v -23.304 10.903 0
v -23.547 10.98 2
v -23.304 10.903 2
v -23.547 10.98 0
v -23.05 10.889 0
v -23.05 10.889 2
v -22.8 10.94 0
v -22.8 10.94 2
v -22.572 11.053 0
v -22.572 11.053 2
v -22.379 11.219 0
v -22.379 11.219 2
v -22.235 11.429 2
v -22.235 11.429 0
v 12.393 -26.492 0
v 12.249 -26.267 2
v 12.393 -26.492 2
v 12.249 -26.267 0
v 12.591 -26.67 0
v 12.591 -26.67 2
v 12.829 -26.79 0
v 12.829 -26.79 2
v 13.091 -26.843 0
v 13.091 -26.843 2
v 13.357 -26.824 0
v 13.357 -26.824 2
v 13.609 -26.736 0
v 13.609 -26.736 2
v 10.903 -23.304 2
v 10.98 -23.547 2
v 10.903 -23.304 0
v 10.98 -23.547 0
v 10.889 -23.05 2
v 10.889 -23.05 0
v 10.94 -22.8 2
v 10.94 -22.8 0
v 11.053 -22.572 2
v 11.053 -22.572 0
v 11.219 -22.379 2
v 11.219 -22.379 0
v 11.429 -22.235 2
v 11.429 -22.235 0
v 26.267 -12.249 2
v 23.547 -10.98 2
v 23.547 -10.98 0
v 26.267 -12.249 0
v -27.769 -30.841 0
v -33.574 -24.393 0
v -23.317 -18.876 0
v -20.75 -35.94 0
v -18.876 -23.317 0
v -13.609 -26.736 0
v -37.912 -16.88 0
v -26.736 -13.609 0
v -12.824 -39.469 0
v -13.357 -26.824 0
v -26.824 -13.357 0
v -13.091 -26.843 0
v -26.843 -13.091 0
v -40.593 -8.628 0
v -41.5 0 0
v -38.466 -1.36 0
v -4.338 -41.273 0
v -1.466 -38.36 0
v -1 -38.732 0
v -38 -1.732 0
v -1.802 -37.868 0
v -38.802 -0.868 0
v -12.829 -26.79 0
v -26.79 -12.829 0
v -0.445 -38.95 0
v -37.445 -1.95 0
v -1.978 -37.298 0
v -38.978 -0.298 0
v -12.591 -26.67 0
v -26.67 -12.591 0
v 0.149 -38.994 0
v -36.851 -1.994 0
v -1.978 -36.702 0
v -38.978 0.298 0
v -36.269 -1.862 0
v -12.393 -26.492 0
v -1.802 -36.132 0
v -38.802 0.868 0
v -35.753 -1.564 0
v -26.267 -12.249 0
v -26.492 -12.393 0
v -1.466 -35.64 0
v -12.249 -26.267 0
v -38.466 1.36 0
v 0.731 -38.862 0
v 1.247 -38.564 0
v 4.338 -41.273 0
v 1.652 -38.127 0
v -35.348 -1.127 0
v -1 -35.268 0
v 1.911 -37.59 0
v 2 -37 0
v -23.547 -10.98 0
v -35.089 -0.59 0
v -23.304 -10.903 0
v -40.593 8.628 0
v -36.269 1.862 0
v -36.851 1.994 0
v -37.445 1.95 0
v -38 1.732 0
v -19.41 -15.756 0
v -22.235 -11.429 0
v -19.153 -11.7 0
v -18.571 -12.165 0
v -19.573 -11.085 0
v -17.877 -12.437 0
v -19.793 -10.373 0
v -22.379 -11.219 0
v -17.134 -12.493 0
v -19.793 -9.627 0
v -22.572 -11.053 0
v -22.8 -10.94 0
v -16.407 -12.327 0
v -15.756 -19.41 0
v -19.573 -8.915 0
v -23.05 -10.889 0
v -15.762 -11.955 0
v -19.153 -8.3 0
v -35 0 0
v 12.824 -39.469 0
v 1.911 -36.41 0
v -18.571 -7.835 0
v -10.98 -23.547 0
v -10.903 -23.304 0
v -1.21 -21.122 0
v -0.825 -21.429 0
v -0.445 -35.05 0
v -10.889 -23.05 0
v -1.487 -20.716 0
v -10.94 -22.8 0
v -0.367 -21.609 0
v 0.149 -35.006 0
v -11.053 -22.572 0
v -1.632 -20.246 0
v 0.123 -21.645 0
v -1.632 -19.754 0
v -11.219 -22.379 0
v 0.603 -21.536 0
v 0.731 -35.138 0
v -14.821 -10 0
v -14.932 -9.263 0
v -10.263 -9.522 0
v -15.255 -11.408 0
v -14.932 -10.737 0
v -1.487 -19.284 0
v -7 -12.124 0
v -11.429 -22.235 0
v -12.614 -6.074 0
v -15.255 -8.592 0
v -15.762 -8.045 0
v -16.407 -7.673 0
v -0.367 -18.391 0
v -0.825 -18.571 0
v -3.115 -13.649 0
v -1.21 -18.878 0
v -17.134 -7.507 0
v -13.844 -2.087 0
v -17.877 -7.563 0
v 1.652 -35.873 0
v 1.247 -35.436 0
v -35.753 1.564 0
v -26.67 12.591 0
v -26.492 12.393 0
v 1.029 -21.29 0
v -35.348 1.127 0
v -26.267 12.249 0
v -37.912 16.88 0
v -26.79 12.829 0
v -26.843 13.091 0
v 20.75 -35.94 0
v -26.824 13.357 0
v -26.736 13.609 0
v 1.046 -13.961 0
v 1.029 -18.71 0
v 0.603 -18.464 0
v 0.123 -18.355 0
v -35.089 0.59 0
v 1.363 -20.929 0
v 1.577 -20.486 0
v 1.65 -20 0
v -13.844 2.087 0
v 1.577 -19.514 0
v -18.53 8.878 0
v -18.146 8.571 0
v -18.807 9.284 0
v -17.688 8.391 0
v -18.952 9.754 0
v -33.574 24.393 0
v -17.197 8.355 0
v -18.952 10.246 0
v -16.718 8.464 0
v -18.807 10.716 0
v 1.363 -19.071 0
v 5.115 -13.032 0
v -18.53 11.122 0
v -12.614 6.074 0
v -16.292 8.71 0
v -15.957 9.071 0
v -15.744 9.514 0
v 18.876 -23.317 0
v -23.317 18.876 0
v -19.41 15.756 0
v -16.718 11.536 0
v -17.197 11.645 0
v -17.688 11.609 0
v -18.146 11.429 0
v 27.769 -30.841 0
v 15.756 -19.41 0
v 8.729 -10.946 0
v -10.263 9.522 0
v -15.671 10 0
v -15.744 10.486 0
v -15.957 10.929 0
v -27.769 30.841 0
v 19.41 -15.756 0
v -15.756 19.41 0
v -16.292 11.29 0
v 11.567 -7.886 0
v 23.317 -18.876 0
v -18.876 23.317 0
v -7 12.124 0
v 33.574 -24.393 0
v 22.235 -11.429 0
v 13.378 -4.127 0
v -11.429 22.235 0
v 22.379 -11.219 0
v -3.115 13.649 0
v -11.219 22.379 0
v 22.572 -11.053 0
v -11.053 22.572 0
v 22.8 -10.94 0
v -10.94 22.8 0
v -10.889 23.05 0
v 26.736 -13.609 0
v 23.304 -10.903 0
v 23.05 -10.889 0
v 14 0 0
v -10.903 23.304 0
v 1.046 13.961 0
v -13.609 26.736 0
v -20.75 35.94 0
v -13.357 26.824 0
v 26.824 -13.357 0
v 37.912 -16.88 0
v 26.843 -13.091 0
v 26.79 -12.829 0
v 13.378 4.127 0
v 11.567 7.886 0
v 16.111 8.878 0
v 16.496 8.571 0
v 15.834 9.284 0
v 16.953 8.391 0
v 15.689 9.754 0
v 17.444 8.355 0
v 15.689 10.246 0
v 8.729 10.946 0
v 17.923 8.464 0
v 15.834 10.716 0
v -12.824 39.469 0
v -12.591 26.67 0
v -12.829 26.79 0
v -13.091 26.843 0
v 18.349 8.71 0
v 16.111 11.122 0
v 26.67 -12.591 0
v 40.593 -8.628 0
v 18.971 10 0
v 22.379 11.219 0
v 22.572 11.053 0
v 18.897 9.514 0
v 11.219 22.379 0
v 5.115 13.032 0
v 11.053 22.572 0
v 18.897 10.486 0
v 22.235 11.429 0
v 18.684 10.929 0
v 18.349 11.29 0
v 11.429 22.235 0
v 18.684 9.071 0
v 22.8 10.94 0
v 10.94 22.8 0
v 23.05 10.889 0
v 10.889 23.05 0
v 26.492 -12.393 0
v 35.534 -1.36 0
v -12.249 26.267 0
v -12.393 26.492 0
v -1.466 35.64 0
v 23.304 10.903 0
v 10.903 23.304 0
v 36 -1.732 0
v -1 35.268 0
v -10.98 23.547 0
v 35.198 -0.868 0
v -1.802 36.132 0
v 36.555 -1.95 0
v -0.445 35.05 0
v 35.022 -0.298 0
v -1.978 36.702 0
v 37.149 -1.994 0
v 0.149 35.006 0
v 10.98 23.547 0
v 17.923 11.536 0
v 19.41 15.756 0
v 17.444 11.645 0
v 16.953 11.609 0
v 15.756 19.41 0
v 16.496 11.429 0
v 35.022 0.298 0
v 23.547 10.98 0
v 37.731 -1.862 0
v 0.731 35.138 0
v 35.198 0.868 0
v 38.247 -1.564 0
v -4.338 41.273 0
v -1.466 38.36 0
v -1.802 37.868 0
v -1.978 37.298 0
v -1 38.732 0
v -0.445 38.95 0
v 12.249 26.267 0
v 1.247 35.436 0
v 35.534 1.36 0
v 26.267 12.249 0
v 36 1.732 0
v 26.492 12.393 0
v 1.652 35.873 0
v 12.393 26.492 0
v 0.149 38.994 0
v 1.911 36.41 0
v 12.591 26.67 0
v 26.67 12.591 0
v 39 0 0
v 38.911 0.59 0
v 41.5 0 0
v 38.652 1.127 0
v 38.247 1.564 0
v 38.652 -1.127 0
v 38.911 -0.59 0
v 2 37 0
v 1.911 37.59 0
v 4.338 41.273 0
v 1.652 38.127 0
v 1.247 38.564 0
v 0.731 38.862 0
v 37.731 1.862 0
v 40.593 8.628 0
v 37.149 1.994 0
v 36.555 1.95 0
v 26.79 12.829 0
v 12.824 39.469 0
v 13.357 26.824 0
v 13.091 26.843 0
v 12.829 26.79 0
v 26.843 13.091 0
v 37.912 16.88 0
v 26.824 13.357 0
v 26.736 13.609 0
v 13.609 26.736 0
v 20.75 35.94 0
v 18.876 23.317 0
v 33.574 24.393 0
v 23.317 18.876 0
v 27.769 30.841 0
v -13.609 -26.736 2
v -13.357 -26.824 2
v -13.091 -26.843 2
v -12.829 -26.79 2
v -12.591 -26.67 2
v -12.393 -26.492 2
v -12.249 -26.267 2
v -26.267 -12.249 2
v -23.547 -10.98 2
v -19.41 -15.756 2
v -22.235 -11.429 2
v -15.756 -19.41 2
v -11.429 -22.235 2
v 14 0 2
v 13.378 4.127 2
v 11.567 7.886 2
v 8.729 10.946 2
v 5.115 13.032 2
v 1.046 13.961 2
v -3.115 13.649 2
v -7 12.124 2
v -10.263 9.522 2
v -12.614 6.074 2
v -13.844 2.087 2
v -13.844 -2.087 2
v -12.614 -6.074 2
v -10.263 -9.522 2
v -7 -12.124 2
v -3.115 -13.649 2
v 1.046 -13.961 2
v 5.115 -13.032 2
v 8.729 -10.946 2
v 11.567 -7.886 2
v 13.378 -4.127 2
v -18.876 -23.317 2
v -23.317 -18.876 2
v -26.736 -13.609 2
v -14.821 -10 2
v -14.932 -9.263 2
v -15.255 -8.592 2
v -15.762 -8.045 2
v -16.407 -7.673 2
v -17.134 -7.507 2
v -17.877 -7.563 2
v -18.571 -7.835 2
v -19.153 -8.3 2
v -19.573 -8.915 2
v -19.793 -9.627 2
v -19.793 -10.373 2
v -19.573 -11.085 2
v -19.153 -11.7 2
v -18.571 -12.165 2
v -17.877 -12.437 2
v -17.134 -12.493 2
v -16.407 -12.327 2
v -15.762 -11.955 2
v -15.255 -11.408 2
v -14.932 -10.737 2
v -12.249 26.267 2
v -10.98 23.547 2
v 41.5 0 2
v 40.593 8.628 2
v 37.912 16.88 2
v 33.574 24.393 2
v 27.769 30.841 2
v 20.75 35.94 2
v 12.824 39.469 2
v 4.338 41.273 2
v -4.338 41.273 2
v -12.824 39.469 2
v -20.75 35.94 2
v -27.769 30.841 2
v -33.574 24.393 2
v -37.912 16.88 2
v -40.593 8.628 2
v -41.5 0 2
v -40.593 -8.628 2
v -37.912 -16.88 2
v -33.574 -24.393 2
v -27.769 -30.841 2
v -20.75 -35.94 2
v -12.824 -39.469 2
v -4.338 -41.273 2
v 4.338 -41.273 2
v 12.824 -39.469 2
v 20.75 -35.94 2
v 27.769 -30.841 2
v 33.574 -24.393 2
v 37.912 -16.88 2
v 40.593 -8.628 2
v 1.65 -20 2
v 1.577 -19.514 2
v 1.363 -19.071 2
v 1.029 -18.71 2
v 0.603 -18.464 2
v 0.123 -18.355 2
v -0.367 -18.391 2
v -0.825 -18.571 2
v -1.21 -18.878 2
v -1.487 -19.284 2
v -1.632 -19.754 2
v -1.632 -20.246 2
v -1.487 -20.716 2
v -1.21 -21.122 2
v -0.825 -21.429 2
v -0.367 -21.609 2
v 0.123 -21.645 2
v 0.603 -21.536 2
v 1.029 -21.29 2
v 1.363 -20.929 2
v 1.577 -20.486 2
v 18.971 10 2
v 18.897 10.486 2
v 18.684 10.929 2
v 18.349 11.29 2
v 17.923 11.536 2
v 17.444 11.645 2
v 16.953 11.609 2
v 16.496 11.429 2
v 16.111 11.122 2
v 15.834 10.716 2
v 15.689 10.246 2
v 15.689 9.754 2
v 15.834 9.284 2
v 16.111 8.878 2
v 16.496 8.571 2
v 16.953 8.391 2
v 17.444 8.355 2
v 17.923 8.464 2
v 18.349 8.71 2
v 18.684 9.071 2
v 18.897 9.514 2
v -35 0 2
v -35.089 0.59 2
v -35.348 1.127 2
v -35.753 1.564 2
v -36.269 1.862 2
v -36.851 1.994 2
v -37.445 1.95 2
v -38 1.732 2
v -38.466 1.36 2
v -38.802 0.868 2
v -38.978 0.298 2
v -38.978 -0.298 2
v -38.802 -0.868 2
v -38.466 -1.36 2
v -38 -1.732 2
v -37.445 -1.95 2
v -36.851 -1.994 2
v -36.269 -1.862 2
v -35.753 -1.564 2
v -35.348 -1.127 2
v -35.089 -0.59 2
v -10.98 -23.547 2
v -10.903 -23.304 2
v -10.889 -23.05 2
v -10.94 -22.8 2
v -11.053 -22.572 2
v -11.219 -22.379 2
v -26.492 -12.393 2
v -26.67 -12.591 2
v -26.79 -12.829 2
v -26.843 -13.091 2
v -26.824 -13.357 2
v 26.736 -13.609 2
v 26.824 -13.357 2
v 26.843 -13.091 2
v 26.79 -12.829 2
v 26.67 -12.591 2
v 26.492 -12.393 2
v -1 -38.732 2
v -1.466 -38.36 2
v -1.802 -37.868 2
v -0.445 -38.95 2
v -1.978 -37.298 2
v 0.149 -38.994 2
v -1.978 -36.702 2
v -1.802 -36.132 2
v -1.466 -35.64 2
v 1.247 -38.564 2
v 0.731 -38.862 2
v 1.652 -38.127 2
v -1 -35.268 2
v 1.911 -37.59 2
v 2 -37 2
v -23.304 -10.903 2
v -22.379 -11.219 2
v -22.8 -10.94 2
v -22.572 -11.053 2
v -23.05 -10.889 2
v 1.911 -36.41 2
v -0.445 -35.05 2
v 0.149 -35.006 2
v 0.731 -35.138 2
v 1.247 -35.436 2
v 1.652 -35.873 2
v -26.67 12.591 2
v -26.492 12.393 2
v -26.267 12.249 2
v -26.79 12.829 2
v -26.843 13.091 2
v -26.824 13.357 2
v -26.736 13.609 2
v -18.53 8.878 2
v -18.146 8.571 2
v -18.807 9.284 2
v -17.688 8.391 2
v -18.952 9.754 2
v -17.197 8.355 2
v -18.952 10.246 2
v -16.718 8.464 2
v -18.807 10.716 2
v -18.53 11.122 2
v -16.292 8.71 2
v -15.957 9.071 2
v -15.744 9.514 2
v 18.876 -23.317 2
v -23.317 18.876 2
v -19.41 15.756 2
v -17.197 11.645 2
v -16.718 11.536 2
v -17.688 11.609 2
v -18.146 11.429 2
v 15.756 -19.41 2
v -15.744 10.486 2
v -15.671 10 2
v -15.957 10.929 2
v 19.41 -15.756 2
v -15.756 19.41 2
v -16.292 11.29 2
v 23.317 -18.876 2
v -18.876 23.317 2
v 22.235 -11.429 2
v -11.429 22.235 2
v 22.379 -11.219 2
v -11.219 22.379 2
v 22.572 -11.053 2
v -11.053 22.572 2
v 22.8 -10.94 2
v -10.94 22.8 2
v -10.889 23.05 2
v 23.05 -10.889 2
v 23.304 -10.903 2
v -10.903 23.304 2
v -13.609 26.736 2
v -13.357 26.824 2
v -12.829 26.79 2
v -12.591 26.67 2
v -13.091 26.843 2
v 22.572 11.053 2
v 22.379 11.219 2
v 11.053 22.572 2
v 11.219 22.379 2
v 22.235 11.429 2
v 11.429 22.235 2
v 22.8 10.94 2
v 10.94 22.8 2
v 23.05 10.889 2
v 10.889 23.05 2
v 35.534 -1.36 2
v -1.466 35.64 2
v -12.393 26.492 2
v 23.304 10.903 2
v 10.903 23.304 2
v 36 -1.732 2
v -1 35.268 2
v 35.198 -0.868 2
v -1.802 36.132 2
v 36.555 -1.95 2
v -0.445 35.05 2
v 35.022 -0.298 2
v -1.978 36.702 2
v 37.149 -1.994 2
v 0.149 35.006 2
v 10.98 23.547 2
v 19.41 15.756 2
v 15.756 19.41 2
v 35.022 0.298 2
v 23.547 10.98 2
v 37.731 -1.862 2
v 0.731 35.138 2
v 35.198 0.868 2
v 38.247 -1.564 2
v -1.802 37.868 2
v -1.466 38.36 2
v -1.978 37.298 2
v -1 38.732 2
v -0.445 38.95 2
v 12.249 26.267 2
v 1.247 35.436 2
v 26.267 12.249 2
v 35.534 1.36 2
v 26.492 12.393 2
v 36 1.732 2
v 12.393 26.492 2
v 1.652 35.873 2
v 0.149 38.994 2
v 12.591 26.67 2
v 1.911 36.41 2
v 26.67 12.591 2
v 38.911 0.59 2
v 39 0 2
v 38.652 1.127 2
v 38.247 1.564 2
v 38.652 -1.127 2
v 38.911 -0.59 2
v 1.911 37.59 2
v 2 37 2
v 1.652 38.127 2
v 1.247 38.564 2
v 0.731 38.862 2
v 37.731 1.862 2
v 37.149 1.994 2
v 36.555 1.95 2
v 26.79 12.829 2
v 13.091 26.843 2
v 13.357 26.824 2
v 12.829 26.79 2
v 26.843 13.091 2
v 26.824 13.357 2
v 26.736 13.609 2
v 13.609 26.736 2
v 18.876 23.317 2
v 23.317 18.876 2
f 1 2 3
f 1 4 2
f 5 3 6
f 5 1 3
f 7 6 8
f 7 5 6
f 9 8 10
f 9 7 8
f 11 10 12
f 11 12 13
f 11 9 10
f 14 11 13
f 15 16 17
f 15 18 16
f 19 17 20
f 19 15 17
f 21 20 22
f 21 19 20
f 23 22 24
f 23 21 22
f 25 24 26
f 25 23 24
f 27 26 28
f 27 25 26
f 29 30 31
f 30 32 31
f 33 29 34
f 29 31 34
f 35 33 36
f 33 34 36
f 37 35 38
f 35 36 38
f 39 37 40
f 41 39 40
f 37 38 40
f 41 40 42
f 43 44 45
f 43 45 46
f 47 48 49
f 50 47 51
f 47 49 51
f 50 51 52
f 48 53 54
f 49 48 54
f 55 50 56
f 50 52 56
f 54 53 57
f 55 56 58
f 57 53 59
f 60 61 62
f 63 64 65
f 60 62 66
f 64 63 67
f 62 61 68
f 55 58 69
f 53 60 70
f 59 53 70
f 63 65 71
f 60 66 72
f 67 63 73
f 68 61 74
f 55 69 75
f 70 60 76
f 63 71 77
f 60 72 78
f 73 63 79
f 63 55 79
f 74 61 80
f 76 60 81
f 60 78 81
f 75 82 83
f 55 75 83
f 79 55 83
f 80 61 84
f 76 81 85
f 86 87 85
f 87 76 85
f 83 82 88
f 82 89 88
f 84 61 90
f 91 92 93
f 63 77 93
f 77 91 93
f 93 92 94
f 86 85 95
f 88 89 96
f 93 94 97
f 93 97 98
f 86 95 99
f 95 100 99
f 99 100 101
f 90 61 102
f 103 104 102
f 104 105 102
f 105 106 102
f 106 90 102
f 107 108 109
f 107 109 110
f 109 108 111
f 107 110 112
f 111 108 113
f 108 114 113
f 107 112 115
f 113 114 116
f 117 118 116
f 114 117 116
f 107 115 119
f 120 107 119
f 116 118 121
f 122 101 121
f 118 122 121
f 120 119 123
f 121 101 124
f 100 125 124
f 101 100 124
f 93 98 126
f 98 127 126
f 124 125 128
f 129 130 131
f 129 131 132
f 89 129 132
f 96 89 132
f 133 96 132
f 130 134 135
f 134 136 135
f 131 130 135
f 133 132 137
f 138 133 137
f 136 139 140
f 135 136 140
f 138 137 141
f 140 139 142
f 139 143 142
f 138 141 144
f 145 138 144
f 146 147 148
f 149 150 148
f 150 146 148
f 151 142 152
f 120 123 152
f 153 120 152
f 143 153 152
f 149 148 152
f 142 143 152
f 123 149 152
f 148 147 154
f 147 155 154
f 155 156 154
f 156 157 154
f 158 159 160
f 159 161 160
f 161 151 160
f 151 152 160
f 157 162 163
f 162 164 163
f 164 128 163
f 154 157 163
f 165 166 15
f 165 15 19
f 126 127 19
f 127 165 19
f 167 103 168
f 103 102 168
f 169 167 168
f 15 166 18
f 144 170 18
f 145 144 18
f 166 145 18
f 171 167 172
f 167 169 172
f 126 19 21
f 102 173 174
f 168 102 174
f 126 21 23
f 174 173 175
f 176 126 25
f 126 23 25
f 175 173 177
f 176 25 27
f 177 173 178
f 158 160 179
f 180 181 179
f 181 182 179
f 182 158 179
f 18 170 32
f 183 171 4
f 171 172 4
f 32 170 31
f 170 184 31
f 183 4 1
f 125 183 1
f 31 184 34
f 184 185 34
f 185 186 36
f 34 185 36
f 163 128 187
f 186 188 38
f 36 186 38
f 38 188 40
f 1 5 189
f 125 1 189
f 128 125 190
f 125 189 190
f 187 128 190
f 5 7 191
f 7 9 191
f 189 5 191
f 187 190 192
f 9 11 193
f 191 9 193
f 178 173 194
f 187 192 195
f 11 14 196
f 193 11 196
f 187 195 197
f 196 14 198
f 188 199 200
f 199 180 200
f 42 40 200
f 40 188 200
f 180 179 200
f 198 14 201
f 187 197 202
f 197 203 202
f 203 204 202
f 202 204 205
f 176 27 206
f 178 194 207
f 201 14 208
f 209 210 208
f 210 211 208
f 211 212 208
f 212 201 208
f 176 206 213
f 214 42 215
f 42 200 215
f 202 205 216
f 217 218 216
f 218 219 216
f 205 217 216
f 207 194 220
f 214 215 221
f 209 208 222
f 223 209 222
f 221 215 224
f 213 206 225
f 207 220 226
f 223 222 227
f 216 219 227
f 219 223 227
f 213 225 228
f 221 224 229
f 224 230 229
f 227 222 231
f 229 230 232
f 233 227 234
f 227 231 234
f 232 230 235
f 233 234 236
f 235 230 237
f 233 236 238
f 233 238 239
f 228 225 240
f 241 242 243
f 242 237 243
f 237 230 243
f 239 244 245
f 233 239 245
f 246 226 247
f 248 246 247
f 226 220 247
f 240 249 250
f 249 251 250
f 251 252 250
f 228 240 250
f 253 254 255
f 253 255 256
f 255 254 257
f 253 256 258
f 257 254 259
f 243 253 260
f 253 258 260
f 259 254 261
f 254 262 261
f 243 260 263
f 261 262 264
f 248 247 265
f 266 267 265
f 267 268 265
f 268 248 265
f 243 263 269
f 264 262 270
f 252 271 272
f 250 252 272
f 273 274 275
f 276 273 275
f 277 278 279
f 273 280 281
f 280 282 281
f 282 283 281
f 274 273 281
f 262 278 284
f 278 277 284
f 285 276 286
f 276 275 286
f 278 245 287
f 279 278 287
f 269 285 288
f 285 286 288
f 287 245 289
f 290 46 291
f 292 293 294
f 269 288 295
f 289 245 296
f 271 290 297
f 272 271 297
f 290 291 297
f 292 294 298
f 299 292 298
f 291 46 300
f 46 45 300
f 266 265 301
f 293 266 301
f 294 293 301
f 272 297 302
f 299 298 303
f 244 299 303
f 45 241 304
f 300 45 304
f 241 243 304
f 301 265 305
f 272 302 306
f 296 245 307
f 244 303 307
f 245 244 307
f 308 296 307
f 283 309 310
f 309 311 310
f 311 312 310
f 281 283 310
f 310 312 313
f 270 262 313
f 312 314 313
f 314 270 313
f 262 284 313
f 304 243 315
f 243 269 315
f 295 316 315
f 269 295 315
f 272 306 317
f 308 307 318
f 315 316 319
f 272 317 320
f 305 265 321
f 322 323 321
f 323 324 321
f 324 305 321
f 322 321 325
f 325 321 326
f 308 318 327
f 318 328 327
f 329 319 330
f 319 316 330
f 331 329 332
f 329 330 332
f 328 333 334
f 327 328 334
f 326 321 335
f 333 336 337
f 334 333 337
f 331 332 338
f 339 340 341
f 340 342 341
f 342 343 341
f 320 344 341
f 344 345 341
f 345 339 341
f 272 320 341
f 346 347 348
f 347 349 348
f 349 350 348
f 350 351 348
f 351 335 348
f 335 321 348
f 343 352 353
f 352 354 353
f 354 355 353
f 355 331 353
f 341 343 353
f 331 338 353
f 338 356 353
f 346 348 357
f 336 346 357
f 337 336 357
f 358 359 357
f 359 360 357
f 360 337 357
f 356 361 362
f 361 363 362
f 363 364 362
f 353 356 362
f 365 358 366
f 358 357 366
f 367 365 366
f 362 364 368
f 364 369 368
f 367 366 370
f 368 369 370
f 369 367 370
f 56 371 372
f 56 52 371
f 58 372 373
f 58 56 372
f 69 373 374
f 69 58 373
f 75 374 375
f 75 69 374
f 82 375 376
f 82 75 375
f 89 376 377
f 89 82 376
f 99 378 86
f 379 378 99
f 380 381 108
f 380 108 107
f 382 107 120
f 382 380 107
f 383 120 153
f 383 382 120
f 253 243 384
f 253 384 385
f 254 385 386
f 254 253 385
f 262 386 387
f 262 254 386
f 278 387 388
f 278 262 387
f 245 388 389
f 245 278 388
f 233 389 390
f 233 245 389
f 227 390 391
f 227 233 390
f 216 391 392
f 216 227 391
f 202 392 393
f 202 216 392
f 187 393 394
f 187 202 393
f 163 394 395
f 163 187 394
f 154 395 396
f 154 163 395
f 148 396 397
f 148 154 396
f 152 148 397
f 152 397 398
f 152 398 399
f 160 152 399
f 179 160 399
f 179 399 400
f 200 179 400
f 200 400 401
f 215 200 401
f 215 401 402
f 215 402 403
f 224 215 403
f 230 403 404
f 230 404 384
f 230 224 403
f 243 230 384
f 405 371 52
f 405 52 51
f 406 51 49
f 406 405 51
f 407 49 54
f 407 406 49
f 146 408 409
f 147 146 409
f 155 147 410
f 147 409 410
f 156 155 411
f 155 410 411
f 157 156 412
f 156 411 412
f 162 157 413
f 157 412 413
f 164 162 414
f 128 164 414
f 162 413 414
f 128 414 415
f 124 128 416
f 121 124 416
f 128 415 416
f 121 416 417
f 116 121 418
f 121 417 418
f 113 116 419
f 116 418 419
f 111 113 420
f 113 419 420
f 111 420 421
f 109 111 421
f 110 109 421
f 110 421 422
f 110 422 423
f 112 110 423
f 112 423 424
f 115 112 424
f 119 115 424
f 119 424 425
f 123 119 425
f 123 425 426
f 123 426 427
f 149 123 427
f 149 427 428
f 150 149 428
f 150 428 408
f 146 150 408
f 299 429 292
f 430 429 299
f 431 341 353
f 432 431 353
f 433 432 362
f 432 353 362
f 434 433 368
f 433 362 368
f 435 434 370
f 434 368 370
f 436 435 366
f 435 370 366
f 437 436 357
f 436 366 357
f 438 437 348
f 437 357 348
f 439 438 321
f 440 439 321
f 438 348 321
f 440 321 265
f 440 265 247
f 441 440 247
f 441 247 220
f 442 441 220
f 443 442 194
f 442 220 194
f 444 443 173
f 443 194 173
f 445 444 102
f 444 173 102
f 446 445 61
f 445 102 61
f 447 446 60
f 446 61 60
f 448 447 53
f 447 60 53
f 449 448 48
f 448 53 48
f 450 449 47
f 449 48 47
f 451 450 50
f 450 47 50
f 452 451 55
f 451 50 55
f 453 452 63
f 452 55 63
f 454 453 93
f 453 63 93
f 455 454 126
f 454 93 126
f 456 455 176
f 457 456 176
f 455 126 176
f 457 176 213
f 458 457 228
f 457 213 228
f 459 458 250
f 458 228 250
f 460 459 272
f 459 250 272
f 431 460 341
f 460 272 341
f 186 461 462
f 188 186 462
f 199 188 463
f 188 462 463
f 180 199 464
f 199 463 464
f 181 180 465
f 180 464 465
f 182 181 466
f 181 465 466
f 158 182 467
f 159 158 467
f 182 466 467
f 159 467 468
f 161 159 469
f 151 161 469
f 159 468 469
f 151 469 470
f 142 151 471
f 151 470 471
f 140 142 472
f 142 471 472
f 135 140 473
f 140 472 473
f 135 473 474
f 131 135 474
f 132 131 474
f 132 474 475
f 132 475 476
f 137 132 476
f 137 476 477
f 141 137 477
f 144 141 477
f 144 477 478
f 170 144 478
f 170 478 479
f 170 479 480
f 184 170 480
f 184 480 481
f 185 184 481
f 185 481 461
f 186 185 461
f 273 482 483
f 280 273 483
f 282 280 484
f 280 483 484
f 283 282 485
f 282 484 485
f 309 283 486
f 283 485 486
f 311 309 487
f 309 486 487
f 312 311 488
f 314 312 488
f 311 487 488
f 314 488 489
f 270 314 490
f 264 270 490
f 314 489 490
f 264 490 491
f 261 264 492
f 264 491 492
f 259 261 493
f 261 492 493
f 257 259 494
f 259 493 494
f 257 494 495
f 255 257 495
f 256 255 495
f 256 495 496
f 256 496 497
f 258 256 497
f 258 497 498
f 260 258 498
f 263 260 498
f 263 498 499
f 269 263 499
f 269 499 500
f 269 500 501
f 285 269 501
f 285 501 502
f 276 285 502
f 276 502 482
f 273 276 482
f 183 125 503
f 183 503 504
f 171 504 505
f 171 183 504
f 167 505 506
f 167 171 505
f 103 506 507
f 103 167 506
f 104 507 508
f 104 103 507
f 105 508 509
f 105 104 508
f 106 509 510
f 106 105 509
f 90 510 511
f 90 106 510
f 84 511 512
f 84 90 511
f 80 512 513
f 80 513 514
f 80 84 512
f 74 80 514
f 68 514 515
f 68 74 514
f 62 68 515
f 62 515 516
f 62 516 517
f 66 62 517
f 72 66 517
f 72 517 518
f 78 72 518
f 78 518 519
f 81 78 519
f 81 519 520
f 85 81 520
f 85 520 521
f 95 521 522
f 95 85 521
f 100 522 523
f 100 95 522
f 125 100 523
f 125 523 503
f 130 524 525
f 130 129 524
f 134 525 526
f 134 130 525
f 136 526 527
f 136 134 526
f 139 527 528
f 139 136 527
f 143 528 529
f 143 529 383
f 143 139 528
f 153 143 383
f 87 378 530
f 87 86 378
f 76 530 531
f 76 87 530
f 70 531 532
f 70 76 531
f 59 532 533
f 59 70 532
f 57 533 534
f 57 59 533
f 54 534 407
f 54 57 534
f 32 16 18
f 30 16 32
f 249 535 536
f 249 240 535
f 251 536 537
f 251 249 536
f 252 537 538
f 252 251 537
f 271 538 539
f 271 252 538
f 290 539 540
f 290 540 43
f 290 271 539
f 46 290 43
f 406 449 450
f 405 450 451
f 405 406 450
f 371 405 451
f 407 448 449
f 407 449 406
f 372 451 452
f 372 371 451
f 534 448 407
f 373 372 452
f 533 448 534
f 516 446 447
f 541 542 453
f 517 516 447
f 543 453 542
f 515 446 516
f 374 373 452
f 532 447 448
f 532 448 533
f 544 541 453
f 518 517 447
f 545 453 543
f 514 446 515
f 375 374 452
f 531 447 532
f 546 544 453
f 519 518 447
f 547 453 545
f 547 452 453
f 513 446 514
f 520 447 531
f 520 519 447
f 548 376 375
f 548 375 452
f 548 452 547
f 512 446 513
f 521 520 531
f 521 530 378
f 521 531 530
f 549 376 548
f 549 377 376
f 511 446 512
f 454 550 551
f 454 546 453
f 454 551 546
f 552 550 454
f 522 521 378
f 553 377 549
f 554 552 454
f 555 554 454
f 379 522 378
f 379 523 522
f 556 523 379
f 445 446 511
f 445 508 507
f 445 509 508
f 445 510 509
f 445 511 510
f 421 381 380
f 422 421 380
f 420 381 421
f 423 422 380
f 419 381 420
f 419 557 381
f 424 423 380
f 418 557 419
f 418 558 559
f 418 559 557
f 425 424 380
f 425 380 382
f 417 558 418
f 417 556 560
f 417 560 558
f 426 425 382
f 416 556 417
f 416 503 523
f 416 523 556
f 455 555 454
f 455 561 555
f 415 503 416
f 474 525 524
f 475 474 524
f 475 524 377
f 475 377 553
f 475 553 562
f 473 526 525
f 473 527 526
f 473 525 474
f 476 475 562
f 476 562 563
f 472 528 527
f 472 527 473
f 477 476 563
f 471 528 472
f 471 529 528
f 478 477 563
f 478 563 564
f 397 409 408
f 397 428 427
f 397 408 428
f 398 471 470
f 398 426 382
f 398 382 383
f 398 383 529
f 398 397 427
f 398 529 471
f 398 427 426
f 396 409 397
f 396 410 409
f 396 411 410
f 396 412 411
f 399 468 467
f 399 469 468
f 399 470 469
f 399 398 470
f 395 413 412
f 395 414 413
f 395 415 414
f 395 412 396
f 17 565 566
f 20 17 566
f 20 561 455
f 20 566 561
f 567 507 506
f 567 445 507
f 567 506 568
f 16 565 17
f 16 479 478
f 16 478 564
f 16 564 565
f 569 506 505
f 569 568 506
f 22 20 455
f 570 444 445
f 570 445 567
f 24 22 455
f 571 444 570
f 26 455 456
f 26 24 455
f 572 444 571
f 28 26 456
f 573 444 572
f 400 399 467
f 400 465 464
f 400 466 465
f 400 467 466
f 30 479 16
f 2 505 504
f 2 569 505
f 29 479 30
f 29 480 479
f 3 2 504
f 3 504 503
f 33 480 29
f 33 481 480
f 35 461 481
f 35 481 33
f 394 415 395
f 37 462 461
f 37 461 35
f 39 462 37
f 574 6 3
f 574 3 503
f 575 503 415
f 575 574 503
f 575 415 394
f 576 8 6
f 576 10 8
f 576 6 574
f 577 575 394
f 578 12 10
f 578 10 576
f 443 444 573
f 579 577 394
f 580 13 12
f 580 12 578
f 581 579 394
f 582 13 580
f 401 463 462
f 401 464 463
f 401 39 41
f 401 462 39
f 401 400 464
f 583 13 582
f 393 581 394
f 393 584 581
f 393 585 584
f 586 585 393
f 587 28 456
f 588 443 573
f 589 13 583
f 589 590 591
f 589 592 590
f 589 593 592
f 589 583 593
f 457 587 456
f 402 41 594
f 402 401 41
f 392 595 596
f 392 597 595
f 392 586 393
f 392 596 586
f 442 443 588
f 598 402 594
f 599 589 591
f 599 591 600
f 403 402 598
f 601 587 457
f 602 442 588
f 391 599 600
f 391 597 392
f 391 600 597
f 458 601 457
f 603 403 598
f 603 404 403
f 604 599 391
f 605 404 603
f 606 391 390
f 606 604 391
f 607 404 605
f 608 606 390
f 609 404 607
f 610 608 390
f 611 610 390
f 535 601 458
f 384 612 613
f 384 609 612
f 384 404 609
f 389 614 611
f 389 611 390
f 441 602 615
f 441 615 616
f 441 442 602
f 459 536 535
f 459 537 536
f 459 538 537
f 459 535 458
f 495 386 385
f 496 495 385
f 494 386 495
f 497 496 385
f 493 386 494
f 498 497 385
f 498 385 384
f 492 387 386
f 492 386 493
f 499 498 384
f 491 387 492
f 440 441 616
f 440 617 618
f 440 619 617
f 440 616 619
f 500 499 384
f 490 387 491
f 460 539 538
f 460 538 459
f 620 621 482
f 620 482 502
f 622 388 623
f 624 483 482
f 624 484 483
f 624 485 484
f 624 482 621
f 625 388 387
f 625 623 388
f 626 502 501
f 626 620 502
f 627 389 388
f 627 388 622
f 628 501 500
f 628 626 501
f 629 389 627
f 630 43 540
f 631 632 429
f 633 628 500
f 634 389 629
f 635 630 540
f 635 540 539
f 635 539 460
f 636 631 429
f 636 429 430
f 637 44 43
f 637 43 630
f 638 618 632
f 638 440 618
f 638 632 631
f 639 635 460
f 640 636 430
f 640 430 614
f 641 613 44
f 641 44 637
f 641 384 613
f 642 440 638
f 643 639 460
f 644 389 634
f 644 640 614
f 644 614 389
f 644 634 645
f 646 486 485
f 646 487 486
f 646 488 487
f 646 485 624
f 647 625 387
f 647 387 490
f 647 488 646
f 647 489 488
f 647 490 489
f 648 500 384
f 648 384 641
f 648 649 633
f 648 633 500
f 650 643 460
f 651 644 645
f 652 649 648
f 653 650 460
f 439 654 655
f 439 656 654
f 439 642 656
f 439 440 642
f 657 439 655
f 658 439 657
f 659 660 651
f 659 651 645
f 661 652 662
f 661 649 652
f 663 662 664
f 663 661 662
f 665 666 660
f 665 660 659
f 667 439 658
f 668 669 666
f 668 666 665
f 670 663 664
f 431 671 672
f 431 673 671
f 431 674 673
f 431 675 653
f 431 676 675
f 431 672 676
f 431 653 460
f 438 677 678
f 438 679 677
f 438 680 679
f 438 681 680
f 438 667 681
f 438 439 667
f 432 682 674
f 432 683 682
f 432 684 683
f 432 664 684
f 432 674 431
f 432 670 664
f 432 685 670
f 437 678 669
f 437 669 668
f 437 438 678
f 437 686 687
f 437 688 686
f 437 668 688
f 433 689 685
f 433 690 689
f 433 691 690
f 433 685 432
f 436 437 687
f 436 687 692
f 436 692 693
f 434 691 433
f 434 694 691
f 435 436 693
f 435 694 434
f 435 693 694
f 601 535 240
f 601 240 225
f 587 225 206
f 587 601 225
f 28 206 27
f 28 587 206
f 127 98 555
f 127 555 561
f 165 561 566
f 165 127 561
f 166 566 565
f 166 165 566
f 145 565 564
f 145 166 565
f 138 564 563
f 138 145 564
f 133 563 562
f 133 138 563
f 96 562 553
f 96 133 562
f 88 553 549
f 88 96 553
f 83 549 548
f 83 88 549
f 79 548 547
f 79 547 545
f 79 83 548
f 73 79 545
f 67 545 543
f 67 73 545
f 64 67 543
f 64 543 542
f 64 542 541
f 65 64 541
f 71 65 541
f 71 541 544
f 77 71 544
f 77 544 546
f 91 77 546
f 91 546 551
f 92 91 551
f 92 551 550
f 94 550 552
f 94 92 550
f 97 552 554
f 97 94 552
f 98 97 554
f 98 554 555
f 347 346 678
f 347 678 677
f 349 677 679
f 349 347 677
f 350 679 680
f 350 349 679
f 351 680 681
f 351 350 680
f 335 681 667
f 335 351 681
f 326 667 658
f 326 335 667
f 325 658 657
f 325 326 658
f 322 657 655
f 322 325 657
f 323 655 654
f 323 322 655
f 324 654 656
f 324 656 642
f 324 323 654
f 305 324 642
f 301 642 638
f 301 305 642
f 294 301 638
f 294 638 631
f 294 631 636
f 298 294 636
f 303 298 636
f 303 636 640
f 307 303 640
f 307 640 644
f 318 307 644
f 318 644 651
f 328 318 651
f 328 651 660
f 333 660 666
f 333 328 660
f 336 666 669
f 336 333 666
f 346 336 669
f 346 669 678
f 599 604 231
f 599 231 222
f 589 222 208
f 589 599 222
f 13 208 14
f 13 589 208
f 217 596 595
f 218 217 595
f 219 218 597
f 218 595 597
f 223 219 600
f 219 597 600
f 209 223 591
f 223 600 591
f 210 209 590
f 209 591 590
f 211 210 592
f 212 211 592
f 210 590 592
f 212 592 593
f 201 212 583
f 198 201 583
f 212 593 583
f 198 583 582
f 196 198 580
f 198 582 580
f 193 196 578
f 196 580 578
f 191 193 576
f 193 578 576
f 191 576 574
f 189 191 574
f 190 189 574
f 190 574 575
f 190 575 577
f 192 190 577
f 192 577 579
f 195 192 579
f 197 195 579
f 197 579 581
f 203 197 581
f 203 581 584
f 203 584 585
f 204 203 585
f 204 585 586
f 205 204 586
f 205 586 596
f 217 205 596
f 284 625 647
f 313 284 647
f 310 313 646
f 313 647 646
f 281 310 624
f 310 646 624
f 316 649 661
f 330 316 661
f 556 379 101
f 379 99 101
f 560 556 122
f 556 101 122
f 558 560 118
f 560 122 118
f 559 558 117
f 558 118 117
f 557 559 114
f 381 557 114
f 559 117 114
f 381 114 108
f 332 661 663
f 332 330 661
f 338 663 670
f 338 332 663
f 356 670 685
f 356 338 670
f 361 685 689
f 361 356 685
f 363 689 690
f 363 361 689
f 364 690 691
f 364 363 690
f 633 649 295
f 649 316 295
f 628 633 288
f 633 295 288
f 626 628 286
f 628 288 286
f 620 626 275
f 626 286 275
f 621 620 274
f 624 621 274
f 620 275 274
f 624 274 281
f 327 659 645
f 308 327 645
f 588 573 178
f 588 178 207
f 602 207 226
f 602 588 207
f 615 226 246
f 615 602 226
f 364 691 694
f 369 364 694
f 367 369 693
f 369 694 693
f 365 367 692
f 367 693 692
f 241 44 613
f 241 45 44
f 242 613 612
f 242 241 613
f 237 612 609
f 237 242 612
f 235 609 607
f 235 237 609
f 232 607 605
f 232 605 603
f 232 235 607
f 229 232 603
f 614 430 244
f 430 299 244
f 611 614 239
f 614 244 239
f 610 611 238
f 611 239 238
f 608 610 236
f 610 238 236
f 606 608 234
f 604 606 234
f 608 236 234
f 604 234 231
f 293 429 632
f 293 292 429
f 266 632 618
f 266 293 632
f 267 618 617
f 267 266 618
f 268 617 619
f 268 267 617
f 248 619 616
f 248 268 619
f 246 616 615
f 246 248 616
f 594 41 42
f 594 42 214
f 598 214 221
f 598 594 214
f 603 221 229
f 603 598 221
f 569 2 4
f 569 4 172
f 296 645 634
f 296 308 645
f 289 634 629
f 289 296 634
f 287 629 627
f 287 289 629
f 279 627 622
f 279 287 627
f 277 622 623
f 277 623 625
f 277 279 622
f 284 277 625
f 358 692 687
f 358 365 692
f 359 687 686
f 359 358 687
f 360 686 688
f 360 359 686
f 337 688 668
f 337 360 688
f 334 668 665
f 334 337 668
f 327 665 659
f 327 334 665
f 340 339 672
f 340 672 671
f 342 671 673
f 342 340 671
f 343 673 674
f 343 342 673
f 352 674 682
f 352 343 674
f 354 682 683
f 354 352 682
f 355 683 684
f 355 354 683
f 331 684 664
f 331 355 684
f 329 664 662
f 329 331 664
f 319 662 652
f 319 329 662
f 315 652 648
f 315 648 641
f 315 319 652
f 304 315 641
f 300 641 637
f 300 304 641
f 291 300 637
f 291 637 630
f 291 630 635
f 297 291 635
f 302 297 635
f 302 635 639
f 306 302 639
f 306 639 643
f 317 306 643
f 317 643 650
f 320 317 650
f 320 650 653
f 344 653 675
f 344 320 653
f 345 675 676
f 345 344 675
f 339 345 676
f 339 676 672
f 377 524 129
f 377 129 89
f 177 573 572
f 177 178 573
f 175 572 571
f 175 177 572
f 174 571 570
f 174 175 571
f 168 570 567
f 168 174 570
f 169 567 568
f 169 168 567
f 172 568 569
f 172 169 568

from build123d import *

# Parameters (mm, degrees)
SKETCH_1_R          = 41.5
SKETCH_1_R_2        = 2
SKETCH_1_R_3        = 14
EXTRUDE_1_DEPTH     = 2
CUT_EXTRUDE_3_DEPTH = 2
FILLET_1_R          = 1
SKETCH_5_R          = 1.65
CUT_EXTRUDE_4_DEPTH = 10
SKETCH_6_R          = 2.5
CUT_EXTRUDE_5_DEPTH = 10


with BuildPart() as part:
    # 草图1 → 凸台-拉伸1 (new body)
    with BuildSketch(Plane.XY):
        Circle(SKETCH_1_R)
        with Locations((0, -37)):
            Circle(SKETCH_1_R_2, mode=Mode.SUBTRACT)
        with Locations((-37, 0)):
            Circle(SKETCH_1_R_2, mode=Mode.SUBTRACT)
        with Locations((0, 37)):
            Circle(SKETCH_1_R_2, mode=Mode.SUBTRACT)
        with Locations((37, 0)):
            Circle(SKETCH_1_R_2, mode=Mode.SUBTRACT)
        Circle(SKETCH_1_R_3, mode=Mode.SUBTRACT)
    extrude(amount=EXTRUDE_1_DEPTH)

    # 草图4 → 切除-拉伸3 (cut)
    with BuildSketch(Plane.XY.offset(2)):
        with BuildLine():
            ThreePointArc((-10.565456544, 22.657694676), (-17.67766953, 17.67766953), (-22.657694676, 10.565456544))
            Line((-22.657694676, 10.565456544), (-27.189233611, 12.678547852))
            ThreePointArc((-27.189233611, 12.678547852), (-21.213203436, 21.213203436), (-12.678547852, 27.189233611))
            Line((-12.678547852, 27.189233611), (-10.565456544, 22.657694676))
        make_face()
        with BuildLine():
            Line((22.657694676, 10.565456544), (27.189233611, 12.678547852))
            ThreePointArc((27.189233611, 12.678547852), (21.213203436, 21.213203436), (12.678547852, 27.189233611))
            Line((12.678547852, 27.189233611), (10.565456544, 22.657694676))
            ThreePointArc((10.565456544, 22.657694676), (17.67766953, 17.67766953), (22.657694676, 10.565456544))
        make_face()
        with BuildLine():
            ThreePointArc((-22.657694676, -10.565456544), (-17.67766953, -17.67766953), (-10.565456544, -22.657694676))
            Line((-10.565456544, -22.657694676), (-12.678547852, -27.189233611))
            ThreePointArc((-12.678547852, -27.189233611), (-21.213203436, -21.213203436), (-27.189233611, -12.678547852))
            Line((-27.189233611, -12.678547852), (-22.657694676, -10.565456544))
        make_face()
        with BuildLine():
            ThreePointArc((10.565456544, -22.657694676), (17.67766953, -17.67766953), (22.657694676, -10.565456544))
            Line((22.657694676, -10.565456544), (27.189233611, -12.678547852))
            ThreePointArc((27.189233611, -12.678547852), (21.213203436, -21.213203436), (12.678547852, -27.189233611))
            Line((12.678547852, -27.189233611), (10.565456544, -22.657694676))
        make_face()
    extrude(amount=-CUT_EXTRUDE_3_DEPTH, mode=Mode.SUBTRACT)

    # 圆角1
    fillet_1_edges = [part.edges().sort_by_distance(p)[0] for p in [
        (27.189233611, 12.678547852, 1),
        (22.657694676, 10.565456544, 1),
        (10.565456544, 22.657694676, 1),
        (12.678547852, 27.189233611, 1),
        (-22.657694676, -10.565456544, 1),
        (-10.565456544, -22.657694676, 1),
        (-12.678547852, -27.189233611, 1),
        (-27.189233611, -12.678547852, 1),
        (10.565456544, -22.657694676, 1),
        (22.657694676, -10.565456544, 1),
        (27.189233611, -12.678547852, 1),
        (12.678547852, -27.189233611, 1),
        (-10.565456544, 22.657694676, 1),
        (-22.657694676, 10.565456544, 1),
        (-27.189233611, 12.678547852, 1),
        (-12.678547852, 27.189233611, 1),
    ]]
    fillet(fillet_1_edges, radius=FILLET_1_R)

    # 草图5 → 切除-拉伸4 (cut)
    with BuildSketch(Plane.XY.offset(2)):
        with Locations((-17.320508076, 10)):
            Circle(SKETCH_5_R)
        with Locations((17.320508076, 10)):
            Circle(SKETCH_5_R)
        with Locations((0, -20)):
            Circle(SKETCH_5_R)
    extrude(amount=-CUT_EXTRUDE_4_DEPTH, mode=Mode.SUBTRACT)

    # 草图6 → 切除-拉伸5 (cut)
    with BuildSketch(Plane.XY.offset(2)):
        with Locations((-17.320508076, -10)):
            Circle(SKETCH_6_R)
    extrude(amount=-CUT_EXTRUDE_5_DEPTH, mode=Mode.SUBTRACT)


solid = part.part
